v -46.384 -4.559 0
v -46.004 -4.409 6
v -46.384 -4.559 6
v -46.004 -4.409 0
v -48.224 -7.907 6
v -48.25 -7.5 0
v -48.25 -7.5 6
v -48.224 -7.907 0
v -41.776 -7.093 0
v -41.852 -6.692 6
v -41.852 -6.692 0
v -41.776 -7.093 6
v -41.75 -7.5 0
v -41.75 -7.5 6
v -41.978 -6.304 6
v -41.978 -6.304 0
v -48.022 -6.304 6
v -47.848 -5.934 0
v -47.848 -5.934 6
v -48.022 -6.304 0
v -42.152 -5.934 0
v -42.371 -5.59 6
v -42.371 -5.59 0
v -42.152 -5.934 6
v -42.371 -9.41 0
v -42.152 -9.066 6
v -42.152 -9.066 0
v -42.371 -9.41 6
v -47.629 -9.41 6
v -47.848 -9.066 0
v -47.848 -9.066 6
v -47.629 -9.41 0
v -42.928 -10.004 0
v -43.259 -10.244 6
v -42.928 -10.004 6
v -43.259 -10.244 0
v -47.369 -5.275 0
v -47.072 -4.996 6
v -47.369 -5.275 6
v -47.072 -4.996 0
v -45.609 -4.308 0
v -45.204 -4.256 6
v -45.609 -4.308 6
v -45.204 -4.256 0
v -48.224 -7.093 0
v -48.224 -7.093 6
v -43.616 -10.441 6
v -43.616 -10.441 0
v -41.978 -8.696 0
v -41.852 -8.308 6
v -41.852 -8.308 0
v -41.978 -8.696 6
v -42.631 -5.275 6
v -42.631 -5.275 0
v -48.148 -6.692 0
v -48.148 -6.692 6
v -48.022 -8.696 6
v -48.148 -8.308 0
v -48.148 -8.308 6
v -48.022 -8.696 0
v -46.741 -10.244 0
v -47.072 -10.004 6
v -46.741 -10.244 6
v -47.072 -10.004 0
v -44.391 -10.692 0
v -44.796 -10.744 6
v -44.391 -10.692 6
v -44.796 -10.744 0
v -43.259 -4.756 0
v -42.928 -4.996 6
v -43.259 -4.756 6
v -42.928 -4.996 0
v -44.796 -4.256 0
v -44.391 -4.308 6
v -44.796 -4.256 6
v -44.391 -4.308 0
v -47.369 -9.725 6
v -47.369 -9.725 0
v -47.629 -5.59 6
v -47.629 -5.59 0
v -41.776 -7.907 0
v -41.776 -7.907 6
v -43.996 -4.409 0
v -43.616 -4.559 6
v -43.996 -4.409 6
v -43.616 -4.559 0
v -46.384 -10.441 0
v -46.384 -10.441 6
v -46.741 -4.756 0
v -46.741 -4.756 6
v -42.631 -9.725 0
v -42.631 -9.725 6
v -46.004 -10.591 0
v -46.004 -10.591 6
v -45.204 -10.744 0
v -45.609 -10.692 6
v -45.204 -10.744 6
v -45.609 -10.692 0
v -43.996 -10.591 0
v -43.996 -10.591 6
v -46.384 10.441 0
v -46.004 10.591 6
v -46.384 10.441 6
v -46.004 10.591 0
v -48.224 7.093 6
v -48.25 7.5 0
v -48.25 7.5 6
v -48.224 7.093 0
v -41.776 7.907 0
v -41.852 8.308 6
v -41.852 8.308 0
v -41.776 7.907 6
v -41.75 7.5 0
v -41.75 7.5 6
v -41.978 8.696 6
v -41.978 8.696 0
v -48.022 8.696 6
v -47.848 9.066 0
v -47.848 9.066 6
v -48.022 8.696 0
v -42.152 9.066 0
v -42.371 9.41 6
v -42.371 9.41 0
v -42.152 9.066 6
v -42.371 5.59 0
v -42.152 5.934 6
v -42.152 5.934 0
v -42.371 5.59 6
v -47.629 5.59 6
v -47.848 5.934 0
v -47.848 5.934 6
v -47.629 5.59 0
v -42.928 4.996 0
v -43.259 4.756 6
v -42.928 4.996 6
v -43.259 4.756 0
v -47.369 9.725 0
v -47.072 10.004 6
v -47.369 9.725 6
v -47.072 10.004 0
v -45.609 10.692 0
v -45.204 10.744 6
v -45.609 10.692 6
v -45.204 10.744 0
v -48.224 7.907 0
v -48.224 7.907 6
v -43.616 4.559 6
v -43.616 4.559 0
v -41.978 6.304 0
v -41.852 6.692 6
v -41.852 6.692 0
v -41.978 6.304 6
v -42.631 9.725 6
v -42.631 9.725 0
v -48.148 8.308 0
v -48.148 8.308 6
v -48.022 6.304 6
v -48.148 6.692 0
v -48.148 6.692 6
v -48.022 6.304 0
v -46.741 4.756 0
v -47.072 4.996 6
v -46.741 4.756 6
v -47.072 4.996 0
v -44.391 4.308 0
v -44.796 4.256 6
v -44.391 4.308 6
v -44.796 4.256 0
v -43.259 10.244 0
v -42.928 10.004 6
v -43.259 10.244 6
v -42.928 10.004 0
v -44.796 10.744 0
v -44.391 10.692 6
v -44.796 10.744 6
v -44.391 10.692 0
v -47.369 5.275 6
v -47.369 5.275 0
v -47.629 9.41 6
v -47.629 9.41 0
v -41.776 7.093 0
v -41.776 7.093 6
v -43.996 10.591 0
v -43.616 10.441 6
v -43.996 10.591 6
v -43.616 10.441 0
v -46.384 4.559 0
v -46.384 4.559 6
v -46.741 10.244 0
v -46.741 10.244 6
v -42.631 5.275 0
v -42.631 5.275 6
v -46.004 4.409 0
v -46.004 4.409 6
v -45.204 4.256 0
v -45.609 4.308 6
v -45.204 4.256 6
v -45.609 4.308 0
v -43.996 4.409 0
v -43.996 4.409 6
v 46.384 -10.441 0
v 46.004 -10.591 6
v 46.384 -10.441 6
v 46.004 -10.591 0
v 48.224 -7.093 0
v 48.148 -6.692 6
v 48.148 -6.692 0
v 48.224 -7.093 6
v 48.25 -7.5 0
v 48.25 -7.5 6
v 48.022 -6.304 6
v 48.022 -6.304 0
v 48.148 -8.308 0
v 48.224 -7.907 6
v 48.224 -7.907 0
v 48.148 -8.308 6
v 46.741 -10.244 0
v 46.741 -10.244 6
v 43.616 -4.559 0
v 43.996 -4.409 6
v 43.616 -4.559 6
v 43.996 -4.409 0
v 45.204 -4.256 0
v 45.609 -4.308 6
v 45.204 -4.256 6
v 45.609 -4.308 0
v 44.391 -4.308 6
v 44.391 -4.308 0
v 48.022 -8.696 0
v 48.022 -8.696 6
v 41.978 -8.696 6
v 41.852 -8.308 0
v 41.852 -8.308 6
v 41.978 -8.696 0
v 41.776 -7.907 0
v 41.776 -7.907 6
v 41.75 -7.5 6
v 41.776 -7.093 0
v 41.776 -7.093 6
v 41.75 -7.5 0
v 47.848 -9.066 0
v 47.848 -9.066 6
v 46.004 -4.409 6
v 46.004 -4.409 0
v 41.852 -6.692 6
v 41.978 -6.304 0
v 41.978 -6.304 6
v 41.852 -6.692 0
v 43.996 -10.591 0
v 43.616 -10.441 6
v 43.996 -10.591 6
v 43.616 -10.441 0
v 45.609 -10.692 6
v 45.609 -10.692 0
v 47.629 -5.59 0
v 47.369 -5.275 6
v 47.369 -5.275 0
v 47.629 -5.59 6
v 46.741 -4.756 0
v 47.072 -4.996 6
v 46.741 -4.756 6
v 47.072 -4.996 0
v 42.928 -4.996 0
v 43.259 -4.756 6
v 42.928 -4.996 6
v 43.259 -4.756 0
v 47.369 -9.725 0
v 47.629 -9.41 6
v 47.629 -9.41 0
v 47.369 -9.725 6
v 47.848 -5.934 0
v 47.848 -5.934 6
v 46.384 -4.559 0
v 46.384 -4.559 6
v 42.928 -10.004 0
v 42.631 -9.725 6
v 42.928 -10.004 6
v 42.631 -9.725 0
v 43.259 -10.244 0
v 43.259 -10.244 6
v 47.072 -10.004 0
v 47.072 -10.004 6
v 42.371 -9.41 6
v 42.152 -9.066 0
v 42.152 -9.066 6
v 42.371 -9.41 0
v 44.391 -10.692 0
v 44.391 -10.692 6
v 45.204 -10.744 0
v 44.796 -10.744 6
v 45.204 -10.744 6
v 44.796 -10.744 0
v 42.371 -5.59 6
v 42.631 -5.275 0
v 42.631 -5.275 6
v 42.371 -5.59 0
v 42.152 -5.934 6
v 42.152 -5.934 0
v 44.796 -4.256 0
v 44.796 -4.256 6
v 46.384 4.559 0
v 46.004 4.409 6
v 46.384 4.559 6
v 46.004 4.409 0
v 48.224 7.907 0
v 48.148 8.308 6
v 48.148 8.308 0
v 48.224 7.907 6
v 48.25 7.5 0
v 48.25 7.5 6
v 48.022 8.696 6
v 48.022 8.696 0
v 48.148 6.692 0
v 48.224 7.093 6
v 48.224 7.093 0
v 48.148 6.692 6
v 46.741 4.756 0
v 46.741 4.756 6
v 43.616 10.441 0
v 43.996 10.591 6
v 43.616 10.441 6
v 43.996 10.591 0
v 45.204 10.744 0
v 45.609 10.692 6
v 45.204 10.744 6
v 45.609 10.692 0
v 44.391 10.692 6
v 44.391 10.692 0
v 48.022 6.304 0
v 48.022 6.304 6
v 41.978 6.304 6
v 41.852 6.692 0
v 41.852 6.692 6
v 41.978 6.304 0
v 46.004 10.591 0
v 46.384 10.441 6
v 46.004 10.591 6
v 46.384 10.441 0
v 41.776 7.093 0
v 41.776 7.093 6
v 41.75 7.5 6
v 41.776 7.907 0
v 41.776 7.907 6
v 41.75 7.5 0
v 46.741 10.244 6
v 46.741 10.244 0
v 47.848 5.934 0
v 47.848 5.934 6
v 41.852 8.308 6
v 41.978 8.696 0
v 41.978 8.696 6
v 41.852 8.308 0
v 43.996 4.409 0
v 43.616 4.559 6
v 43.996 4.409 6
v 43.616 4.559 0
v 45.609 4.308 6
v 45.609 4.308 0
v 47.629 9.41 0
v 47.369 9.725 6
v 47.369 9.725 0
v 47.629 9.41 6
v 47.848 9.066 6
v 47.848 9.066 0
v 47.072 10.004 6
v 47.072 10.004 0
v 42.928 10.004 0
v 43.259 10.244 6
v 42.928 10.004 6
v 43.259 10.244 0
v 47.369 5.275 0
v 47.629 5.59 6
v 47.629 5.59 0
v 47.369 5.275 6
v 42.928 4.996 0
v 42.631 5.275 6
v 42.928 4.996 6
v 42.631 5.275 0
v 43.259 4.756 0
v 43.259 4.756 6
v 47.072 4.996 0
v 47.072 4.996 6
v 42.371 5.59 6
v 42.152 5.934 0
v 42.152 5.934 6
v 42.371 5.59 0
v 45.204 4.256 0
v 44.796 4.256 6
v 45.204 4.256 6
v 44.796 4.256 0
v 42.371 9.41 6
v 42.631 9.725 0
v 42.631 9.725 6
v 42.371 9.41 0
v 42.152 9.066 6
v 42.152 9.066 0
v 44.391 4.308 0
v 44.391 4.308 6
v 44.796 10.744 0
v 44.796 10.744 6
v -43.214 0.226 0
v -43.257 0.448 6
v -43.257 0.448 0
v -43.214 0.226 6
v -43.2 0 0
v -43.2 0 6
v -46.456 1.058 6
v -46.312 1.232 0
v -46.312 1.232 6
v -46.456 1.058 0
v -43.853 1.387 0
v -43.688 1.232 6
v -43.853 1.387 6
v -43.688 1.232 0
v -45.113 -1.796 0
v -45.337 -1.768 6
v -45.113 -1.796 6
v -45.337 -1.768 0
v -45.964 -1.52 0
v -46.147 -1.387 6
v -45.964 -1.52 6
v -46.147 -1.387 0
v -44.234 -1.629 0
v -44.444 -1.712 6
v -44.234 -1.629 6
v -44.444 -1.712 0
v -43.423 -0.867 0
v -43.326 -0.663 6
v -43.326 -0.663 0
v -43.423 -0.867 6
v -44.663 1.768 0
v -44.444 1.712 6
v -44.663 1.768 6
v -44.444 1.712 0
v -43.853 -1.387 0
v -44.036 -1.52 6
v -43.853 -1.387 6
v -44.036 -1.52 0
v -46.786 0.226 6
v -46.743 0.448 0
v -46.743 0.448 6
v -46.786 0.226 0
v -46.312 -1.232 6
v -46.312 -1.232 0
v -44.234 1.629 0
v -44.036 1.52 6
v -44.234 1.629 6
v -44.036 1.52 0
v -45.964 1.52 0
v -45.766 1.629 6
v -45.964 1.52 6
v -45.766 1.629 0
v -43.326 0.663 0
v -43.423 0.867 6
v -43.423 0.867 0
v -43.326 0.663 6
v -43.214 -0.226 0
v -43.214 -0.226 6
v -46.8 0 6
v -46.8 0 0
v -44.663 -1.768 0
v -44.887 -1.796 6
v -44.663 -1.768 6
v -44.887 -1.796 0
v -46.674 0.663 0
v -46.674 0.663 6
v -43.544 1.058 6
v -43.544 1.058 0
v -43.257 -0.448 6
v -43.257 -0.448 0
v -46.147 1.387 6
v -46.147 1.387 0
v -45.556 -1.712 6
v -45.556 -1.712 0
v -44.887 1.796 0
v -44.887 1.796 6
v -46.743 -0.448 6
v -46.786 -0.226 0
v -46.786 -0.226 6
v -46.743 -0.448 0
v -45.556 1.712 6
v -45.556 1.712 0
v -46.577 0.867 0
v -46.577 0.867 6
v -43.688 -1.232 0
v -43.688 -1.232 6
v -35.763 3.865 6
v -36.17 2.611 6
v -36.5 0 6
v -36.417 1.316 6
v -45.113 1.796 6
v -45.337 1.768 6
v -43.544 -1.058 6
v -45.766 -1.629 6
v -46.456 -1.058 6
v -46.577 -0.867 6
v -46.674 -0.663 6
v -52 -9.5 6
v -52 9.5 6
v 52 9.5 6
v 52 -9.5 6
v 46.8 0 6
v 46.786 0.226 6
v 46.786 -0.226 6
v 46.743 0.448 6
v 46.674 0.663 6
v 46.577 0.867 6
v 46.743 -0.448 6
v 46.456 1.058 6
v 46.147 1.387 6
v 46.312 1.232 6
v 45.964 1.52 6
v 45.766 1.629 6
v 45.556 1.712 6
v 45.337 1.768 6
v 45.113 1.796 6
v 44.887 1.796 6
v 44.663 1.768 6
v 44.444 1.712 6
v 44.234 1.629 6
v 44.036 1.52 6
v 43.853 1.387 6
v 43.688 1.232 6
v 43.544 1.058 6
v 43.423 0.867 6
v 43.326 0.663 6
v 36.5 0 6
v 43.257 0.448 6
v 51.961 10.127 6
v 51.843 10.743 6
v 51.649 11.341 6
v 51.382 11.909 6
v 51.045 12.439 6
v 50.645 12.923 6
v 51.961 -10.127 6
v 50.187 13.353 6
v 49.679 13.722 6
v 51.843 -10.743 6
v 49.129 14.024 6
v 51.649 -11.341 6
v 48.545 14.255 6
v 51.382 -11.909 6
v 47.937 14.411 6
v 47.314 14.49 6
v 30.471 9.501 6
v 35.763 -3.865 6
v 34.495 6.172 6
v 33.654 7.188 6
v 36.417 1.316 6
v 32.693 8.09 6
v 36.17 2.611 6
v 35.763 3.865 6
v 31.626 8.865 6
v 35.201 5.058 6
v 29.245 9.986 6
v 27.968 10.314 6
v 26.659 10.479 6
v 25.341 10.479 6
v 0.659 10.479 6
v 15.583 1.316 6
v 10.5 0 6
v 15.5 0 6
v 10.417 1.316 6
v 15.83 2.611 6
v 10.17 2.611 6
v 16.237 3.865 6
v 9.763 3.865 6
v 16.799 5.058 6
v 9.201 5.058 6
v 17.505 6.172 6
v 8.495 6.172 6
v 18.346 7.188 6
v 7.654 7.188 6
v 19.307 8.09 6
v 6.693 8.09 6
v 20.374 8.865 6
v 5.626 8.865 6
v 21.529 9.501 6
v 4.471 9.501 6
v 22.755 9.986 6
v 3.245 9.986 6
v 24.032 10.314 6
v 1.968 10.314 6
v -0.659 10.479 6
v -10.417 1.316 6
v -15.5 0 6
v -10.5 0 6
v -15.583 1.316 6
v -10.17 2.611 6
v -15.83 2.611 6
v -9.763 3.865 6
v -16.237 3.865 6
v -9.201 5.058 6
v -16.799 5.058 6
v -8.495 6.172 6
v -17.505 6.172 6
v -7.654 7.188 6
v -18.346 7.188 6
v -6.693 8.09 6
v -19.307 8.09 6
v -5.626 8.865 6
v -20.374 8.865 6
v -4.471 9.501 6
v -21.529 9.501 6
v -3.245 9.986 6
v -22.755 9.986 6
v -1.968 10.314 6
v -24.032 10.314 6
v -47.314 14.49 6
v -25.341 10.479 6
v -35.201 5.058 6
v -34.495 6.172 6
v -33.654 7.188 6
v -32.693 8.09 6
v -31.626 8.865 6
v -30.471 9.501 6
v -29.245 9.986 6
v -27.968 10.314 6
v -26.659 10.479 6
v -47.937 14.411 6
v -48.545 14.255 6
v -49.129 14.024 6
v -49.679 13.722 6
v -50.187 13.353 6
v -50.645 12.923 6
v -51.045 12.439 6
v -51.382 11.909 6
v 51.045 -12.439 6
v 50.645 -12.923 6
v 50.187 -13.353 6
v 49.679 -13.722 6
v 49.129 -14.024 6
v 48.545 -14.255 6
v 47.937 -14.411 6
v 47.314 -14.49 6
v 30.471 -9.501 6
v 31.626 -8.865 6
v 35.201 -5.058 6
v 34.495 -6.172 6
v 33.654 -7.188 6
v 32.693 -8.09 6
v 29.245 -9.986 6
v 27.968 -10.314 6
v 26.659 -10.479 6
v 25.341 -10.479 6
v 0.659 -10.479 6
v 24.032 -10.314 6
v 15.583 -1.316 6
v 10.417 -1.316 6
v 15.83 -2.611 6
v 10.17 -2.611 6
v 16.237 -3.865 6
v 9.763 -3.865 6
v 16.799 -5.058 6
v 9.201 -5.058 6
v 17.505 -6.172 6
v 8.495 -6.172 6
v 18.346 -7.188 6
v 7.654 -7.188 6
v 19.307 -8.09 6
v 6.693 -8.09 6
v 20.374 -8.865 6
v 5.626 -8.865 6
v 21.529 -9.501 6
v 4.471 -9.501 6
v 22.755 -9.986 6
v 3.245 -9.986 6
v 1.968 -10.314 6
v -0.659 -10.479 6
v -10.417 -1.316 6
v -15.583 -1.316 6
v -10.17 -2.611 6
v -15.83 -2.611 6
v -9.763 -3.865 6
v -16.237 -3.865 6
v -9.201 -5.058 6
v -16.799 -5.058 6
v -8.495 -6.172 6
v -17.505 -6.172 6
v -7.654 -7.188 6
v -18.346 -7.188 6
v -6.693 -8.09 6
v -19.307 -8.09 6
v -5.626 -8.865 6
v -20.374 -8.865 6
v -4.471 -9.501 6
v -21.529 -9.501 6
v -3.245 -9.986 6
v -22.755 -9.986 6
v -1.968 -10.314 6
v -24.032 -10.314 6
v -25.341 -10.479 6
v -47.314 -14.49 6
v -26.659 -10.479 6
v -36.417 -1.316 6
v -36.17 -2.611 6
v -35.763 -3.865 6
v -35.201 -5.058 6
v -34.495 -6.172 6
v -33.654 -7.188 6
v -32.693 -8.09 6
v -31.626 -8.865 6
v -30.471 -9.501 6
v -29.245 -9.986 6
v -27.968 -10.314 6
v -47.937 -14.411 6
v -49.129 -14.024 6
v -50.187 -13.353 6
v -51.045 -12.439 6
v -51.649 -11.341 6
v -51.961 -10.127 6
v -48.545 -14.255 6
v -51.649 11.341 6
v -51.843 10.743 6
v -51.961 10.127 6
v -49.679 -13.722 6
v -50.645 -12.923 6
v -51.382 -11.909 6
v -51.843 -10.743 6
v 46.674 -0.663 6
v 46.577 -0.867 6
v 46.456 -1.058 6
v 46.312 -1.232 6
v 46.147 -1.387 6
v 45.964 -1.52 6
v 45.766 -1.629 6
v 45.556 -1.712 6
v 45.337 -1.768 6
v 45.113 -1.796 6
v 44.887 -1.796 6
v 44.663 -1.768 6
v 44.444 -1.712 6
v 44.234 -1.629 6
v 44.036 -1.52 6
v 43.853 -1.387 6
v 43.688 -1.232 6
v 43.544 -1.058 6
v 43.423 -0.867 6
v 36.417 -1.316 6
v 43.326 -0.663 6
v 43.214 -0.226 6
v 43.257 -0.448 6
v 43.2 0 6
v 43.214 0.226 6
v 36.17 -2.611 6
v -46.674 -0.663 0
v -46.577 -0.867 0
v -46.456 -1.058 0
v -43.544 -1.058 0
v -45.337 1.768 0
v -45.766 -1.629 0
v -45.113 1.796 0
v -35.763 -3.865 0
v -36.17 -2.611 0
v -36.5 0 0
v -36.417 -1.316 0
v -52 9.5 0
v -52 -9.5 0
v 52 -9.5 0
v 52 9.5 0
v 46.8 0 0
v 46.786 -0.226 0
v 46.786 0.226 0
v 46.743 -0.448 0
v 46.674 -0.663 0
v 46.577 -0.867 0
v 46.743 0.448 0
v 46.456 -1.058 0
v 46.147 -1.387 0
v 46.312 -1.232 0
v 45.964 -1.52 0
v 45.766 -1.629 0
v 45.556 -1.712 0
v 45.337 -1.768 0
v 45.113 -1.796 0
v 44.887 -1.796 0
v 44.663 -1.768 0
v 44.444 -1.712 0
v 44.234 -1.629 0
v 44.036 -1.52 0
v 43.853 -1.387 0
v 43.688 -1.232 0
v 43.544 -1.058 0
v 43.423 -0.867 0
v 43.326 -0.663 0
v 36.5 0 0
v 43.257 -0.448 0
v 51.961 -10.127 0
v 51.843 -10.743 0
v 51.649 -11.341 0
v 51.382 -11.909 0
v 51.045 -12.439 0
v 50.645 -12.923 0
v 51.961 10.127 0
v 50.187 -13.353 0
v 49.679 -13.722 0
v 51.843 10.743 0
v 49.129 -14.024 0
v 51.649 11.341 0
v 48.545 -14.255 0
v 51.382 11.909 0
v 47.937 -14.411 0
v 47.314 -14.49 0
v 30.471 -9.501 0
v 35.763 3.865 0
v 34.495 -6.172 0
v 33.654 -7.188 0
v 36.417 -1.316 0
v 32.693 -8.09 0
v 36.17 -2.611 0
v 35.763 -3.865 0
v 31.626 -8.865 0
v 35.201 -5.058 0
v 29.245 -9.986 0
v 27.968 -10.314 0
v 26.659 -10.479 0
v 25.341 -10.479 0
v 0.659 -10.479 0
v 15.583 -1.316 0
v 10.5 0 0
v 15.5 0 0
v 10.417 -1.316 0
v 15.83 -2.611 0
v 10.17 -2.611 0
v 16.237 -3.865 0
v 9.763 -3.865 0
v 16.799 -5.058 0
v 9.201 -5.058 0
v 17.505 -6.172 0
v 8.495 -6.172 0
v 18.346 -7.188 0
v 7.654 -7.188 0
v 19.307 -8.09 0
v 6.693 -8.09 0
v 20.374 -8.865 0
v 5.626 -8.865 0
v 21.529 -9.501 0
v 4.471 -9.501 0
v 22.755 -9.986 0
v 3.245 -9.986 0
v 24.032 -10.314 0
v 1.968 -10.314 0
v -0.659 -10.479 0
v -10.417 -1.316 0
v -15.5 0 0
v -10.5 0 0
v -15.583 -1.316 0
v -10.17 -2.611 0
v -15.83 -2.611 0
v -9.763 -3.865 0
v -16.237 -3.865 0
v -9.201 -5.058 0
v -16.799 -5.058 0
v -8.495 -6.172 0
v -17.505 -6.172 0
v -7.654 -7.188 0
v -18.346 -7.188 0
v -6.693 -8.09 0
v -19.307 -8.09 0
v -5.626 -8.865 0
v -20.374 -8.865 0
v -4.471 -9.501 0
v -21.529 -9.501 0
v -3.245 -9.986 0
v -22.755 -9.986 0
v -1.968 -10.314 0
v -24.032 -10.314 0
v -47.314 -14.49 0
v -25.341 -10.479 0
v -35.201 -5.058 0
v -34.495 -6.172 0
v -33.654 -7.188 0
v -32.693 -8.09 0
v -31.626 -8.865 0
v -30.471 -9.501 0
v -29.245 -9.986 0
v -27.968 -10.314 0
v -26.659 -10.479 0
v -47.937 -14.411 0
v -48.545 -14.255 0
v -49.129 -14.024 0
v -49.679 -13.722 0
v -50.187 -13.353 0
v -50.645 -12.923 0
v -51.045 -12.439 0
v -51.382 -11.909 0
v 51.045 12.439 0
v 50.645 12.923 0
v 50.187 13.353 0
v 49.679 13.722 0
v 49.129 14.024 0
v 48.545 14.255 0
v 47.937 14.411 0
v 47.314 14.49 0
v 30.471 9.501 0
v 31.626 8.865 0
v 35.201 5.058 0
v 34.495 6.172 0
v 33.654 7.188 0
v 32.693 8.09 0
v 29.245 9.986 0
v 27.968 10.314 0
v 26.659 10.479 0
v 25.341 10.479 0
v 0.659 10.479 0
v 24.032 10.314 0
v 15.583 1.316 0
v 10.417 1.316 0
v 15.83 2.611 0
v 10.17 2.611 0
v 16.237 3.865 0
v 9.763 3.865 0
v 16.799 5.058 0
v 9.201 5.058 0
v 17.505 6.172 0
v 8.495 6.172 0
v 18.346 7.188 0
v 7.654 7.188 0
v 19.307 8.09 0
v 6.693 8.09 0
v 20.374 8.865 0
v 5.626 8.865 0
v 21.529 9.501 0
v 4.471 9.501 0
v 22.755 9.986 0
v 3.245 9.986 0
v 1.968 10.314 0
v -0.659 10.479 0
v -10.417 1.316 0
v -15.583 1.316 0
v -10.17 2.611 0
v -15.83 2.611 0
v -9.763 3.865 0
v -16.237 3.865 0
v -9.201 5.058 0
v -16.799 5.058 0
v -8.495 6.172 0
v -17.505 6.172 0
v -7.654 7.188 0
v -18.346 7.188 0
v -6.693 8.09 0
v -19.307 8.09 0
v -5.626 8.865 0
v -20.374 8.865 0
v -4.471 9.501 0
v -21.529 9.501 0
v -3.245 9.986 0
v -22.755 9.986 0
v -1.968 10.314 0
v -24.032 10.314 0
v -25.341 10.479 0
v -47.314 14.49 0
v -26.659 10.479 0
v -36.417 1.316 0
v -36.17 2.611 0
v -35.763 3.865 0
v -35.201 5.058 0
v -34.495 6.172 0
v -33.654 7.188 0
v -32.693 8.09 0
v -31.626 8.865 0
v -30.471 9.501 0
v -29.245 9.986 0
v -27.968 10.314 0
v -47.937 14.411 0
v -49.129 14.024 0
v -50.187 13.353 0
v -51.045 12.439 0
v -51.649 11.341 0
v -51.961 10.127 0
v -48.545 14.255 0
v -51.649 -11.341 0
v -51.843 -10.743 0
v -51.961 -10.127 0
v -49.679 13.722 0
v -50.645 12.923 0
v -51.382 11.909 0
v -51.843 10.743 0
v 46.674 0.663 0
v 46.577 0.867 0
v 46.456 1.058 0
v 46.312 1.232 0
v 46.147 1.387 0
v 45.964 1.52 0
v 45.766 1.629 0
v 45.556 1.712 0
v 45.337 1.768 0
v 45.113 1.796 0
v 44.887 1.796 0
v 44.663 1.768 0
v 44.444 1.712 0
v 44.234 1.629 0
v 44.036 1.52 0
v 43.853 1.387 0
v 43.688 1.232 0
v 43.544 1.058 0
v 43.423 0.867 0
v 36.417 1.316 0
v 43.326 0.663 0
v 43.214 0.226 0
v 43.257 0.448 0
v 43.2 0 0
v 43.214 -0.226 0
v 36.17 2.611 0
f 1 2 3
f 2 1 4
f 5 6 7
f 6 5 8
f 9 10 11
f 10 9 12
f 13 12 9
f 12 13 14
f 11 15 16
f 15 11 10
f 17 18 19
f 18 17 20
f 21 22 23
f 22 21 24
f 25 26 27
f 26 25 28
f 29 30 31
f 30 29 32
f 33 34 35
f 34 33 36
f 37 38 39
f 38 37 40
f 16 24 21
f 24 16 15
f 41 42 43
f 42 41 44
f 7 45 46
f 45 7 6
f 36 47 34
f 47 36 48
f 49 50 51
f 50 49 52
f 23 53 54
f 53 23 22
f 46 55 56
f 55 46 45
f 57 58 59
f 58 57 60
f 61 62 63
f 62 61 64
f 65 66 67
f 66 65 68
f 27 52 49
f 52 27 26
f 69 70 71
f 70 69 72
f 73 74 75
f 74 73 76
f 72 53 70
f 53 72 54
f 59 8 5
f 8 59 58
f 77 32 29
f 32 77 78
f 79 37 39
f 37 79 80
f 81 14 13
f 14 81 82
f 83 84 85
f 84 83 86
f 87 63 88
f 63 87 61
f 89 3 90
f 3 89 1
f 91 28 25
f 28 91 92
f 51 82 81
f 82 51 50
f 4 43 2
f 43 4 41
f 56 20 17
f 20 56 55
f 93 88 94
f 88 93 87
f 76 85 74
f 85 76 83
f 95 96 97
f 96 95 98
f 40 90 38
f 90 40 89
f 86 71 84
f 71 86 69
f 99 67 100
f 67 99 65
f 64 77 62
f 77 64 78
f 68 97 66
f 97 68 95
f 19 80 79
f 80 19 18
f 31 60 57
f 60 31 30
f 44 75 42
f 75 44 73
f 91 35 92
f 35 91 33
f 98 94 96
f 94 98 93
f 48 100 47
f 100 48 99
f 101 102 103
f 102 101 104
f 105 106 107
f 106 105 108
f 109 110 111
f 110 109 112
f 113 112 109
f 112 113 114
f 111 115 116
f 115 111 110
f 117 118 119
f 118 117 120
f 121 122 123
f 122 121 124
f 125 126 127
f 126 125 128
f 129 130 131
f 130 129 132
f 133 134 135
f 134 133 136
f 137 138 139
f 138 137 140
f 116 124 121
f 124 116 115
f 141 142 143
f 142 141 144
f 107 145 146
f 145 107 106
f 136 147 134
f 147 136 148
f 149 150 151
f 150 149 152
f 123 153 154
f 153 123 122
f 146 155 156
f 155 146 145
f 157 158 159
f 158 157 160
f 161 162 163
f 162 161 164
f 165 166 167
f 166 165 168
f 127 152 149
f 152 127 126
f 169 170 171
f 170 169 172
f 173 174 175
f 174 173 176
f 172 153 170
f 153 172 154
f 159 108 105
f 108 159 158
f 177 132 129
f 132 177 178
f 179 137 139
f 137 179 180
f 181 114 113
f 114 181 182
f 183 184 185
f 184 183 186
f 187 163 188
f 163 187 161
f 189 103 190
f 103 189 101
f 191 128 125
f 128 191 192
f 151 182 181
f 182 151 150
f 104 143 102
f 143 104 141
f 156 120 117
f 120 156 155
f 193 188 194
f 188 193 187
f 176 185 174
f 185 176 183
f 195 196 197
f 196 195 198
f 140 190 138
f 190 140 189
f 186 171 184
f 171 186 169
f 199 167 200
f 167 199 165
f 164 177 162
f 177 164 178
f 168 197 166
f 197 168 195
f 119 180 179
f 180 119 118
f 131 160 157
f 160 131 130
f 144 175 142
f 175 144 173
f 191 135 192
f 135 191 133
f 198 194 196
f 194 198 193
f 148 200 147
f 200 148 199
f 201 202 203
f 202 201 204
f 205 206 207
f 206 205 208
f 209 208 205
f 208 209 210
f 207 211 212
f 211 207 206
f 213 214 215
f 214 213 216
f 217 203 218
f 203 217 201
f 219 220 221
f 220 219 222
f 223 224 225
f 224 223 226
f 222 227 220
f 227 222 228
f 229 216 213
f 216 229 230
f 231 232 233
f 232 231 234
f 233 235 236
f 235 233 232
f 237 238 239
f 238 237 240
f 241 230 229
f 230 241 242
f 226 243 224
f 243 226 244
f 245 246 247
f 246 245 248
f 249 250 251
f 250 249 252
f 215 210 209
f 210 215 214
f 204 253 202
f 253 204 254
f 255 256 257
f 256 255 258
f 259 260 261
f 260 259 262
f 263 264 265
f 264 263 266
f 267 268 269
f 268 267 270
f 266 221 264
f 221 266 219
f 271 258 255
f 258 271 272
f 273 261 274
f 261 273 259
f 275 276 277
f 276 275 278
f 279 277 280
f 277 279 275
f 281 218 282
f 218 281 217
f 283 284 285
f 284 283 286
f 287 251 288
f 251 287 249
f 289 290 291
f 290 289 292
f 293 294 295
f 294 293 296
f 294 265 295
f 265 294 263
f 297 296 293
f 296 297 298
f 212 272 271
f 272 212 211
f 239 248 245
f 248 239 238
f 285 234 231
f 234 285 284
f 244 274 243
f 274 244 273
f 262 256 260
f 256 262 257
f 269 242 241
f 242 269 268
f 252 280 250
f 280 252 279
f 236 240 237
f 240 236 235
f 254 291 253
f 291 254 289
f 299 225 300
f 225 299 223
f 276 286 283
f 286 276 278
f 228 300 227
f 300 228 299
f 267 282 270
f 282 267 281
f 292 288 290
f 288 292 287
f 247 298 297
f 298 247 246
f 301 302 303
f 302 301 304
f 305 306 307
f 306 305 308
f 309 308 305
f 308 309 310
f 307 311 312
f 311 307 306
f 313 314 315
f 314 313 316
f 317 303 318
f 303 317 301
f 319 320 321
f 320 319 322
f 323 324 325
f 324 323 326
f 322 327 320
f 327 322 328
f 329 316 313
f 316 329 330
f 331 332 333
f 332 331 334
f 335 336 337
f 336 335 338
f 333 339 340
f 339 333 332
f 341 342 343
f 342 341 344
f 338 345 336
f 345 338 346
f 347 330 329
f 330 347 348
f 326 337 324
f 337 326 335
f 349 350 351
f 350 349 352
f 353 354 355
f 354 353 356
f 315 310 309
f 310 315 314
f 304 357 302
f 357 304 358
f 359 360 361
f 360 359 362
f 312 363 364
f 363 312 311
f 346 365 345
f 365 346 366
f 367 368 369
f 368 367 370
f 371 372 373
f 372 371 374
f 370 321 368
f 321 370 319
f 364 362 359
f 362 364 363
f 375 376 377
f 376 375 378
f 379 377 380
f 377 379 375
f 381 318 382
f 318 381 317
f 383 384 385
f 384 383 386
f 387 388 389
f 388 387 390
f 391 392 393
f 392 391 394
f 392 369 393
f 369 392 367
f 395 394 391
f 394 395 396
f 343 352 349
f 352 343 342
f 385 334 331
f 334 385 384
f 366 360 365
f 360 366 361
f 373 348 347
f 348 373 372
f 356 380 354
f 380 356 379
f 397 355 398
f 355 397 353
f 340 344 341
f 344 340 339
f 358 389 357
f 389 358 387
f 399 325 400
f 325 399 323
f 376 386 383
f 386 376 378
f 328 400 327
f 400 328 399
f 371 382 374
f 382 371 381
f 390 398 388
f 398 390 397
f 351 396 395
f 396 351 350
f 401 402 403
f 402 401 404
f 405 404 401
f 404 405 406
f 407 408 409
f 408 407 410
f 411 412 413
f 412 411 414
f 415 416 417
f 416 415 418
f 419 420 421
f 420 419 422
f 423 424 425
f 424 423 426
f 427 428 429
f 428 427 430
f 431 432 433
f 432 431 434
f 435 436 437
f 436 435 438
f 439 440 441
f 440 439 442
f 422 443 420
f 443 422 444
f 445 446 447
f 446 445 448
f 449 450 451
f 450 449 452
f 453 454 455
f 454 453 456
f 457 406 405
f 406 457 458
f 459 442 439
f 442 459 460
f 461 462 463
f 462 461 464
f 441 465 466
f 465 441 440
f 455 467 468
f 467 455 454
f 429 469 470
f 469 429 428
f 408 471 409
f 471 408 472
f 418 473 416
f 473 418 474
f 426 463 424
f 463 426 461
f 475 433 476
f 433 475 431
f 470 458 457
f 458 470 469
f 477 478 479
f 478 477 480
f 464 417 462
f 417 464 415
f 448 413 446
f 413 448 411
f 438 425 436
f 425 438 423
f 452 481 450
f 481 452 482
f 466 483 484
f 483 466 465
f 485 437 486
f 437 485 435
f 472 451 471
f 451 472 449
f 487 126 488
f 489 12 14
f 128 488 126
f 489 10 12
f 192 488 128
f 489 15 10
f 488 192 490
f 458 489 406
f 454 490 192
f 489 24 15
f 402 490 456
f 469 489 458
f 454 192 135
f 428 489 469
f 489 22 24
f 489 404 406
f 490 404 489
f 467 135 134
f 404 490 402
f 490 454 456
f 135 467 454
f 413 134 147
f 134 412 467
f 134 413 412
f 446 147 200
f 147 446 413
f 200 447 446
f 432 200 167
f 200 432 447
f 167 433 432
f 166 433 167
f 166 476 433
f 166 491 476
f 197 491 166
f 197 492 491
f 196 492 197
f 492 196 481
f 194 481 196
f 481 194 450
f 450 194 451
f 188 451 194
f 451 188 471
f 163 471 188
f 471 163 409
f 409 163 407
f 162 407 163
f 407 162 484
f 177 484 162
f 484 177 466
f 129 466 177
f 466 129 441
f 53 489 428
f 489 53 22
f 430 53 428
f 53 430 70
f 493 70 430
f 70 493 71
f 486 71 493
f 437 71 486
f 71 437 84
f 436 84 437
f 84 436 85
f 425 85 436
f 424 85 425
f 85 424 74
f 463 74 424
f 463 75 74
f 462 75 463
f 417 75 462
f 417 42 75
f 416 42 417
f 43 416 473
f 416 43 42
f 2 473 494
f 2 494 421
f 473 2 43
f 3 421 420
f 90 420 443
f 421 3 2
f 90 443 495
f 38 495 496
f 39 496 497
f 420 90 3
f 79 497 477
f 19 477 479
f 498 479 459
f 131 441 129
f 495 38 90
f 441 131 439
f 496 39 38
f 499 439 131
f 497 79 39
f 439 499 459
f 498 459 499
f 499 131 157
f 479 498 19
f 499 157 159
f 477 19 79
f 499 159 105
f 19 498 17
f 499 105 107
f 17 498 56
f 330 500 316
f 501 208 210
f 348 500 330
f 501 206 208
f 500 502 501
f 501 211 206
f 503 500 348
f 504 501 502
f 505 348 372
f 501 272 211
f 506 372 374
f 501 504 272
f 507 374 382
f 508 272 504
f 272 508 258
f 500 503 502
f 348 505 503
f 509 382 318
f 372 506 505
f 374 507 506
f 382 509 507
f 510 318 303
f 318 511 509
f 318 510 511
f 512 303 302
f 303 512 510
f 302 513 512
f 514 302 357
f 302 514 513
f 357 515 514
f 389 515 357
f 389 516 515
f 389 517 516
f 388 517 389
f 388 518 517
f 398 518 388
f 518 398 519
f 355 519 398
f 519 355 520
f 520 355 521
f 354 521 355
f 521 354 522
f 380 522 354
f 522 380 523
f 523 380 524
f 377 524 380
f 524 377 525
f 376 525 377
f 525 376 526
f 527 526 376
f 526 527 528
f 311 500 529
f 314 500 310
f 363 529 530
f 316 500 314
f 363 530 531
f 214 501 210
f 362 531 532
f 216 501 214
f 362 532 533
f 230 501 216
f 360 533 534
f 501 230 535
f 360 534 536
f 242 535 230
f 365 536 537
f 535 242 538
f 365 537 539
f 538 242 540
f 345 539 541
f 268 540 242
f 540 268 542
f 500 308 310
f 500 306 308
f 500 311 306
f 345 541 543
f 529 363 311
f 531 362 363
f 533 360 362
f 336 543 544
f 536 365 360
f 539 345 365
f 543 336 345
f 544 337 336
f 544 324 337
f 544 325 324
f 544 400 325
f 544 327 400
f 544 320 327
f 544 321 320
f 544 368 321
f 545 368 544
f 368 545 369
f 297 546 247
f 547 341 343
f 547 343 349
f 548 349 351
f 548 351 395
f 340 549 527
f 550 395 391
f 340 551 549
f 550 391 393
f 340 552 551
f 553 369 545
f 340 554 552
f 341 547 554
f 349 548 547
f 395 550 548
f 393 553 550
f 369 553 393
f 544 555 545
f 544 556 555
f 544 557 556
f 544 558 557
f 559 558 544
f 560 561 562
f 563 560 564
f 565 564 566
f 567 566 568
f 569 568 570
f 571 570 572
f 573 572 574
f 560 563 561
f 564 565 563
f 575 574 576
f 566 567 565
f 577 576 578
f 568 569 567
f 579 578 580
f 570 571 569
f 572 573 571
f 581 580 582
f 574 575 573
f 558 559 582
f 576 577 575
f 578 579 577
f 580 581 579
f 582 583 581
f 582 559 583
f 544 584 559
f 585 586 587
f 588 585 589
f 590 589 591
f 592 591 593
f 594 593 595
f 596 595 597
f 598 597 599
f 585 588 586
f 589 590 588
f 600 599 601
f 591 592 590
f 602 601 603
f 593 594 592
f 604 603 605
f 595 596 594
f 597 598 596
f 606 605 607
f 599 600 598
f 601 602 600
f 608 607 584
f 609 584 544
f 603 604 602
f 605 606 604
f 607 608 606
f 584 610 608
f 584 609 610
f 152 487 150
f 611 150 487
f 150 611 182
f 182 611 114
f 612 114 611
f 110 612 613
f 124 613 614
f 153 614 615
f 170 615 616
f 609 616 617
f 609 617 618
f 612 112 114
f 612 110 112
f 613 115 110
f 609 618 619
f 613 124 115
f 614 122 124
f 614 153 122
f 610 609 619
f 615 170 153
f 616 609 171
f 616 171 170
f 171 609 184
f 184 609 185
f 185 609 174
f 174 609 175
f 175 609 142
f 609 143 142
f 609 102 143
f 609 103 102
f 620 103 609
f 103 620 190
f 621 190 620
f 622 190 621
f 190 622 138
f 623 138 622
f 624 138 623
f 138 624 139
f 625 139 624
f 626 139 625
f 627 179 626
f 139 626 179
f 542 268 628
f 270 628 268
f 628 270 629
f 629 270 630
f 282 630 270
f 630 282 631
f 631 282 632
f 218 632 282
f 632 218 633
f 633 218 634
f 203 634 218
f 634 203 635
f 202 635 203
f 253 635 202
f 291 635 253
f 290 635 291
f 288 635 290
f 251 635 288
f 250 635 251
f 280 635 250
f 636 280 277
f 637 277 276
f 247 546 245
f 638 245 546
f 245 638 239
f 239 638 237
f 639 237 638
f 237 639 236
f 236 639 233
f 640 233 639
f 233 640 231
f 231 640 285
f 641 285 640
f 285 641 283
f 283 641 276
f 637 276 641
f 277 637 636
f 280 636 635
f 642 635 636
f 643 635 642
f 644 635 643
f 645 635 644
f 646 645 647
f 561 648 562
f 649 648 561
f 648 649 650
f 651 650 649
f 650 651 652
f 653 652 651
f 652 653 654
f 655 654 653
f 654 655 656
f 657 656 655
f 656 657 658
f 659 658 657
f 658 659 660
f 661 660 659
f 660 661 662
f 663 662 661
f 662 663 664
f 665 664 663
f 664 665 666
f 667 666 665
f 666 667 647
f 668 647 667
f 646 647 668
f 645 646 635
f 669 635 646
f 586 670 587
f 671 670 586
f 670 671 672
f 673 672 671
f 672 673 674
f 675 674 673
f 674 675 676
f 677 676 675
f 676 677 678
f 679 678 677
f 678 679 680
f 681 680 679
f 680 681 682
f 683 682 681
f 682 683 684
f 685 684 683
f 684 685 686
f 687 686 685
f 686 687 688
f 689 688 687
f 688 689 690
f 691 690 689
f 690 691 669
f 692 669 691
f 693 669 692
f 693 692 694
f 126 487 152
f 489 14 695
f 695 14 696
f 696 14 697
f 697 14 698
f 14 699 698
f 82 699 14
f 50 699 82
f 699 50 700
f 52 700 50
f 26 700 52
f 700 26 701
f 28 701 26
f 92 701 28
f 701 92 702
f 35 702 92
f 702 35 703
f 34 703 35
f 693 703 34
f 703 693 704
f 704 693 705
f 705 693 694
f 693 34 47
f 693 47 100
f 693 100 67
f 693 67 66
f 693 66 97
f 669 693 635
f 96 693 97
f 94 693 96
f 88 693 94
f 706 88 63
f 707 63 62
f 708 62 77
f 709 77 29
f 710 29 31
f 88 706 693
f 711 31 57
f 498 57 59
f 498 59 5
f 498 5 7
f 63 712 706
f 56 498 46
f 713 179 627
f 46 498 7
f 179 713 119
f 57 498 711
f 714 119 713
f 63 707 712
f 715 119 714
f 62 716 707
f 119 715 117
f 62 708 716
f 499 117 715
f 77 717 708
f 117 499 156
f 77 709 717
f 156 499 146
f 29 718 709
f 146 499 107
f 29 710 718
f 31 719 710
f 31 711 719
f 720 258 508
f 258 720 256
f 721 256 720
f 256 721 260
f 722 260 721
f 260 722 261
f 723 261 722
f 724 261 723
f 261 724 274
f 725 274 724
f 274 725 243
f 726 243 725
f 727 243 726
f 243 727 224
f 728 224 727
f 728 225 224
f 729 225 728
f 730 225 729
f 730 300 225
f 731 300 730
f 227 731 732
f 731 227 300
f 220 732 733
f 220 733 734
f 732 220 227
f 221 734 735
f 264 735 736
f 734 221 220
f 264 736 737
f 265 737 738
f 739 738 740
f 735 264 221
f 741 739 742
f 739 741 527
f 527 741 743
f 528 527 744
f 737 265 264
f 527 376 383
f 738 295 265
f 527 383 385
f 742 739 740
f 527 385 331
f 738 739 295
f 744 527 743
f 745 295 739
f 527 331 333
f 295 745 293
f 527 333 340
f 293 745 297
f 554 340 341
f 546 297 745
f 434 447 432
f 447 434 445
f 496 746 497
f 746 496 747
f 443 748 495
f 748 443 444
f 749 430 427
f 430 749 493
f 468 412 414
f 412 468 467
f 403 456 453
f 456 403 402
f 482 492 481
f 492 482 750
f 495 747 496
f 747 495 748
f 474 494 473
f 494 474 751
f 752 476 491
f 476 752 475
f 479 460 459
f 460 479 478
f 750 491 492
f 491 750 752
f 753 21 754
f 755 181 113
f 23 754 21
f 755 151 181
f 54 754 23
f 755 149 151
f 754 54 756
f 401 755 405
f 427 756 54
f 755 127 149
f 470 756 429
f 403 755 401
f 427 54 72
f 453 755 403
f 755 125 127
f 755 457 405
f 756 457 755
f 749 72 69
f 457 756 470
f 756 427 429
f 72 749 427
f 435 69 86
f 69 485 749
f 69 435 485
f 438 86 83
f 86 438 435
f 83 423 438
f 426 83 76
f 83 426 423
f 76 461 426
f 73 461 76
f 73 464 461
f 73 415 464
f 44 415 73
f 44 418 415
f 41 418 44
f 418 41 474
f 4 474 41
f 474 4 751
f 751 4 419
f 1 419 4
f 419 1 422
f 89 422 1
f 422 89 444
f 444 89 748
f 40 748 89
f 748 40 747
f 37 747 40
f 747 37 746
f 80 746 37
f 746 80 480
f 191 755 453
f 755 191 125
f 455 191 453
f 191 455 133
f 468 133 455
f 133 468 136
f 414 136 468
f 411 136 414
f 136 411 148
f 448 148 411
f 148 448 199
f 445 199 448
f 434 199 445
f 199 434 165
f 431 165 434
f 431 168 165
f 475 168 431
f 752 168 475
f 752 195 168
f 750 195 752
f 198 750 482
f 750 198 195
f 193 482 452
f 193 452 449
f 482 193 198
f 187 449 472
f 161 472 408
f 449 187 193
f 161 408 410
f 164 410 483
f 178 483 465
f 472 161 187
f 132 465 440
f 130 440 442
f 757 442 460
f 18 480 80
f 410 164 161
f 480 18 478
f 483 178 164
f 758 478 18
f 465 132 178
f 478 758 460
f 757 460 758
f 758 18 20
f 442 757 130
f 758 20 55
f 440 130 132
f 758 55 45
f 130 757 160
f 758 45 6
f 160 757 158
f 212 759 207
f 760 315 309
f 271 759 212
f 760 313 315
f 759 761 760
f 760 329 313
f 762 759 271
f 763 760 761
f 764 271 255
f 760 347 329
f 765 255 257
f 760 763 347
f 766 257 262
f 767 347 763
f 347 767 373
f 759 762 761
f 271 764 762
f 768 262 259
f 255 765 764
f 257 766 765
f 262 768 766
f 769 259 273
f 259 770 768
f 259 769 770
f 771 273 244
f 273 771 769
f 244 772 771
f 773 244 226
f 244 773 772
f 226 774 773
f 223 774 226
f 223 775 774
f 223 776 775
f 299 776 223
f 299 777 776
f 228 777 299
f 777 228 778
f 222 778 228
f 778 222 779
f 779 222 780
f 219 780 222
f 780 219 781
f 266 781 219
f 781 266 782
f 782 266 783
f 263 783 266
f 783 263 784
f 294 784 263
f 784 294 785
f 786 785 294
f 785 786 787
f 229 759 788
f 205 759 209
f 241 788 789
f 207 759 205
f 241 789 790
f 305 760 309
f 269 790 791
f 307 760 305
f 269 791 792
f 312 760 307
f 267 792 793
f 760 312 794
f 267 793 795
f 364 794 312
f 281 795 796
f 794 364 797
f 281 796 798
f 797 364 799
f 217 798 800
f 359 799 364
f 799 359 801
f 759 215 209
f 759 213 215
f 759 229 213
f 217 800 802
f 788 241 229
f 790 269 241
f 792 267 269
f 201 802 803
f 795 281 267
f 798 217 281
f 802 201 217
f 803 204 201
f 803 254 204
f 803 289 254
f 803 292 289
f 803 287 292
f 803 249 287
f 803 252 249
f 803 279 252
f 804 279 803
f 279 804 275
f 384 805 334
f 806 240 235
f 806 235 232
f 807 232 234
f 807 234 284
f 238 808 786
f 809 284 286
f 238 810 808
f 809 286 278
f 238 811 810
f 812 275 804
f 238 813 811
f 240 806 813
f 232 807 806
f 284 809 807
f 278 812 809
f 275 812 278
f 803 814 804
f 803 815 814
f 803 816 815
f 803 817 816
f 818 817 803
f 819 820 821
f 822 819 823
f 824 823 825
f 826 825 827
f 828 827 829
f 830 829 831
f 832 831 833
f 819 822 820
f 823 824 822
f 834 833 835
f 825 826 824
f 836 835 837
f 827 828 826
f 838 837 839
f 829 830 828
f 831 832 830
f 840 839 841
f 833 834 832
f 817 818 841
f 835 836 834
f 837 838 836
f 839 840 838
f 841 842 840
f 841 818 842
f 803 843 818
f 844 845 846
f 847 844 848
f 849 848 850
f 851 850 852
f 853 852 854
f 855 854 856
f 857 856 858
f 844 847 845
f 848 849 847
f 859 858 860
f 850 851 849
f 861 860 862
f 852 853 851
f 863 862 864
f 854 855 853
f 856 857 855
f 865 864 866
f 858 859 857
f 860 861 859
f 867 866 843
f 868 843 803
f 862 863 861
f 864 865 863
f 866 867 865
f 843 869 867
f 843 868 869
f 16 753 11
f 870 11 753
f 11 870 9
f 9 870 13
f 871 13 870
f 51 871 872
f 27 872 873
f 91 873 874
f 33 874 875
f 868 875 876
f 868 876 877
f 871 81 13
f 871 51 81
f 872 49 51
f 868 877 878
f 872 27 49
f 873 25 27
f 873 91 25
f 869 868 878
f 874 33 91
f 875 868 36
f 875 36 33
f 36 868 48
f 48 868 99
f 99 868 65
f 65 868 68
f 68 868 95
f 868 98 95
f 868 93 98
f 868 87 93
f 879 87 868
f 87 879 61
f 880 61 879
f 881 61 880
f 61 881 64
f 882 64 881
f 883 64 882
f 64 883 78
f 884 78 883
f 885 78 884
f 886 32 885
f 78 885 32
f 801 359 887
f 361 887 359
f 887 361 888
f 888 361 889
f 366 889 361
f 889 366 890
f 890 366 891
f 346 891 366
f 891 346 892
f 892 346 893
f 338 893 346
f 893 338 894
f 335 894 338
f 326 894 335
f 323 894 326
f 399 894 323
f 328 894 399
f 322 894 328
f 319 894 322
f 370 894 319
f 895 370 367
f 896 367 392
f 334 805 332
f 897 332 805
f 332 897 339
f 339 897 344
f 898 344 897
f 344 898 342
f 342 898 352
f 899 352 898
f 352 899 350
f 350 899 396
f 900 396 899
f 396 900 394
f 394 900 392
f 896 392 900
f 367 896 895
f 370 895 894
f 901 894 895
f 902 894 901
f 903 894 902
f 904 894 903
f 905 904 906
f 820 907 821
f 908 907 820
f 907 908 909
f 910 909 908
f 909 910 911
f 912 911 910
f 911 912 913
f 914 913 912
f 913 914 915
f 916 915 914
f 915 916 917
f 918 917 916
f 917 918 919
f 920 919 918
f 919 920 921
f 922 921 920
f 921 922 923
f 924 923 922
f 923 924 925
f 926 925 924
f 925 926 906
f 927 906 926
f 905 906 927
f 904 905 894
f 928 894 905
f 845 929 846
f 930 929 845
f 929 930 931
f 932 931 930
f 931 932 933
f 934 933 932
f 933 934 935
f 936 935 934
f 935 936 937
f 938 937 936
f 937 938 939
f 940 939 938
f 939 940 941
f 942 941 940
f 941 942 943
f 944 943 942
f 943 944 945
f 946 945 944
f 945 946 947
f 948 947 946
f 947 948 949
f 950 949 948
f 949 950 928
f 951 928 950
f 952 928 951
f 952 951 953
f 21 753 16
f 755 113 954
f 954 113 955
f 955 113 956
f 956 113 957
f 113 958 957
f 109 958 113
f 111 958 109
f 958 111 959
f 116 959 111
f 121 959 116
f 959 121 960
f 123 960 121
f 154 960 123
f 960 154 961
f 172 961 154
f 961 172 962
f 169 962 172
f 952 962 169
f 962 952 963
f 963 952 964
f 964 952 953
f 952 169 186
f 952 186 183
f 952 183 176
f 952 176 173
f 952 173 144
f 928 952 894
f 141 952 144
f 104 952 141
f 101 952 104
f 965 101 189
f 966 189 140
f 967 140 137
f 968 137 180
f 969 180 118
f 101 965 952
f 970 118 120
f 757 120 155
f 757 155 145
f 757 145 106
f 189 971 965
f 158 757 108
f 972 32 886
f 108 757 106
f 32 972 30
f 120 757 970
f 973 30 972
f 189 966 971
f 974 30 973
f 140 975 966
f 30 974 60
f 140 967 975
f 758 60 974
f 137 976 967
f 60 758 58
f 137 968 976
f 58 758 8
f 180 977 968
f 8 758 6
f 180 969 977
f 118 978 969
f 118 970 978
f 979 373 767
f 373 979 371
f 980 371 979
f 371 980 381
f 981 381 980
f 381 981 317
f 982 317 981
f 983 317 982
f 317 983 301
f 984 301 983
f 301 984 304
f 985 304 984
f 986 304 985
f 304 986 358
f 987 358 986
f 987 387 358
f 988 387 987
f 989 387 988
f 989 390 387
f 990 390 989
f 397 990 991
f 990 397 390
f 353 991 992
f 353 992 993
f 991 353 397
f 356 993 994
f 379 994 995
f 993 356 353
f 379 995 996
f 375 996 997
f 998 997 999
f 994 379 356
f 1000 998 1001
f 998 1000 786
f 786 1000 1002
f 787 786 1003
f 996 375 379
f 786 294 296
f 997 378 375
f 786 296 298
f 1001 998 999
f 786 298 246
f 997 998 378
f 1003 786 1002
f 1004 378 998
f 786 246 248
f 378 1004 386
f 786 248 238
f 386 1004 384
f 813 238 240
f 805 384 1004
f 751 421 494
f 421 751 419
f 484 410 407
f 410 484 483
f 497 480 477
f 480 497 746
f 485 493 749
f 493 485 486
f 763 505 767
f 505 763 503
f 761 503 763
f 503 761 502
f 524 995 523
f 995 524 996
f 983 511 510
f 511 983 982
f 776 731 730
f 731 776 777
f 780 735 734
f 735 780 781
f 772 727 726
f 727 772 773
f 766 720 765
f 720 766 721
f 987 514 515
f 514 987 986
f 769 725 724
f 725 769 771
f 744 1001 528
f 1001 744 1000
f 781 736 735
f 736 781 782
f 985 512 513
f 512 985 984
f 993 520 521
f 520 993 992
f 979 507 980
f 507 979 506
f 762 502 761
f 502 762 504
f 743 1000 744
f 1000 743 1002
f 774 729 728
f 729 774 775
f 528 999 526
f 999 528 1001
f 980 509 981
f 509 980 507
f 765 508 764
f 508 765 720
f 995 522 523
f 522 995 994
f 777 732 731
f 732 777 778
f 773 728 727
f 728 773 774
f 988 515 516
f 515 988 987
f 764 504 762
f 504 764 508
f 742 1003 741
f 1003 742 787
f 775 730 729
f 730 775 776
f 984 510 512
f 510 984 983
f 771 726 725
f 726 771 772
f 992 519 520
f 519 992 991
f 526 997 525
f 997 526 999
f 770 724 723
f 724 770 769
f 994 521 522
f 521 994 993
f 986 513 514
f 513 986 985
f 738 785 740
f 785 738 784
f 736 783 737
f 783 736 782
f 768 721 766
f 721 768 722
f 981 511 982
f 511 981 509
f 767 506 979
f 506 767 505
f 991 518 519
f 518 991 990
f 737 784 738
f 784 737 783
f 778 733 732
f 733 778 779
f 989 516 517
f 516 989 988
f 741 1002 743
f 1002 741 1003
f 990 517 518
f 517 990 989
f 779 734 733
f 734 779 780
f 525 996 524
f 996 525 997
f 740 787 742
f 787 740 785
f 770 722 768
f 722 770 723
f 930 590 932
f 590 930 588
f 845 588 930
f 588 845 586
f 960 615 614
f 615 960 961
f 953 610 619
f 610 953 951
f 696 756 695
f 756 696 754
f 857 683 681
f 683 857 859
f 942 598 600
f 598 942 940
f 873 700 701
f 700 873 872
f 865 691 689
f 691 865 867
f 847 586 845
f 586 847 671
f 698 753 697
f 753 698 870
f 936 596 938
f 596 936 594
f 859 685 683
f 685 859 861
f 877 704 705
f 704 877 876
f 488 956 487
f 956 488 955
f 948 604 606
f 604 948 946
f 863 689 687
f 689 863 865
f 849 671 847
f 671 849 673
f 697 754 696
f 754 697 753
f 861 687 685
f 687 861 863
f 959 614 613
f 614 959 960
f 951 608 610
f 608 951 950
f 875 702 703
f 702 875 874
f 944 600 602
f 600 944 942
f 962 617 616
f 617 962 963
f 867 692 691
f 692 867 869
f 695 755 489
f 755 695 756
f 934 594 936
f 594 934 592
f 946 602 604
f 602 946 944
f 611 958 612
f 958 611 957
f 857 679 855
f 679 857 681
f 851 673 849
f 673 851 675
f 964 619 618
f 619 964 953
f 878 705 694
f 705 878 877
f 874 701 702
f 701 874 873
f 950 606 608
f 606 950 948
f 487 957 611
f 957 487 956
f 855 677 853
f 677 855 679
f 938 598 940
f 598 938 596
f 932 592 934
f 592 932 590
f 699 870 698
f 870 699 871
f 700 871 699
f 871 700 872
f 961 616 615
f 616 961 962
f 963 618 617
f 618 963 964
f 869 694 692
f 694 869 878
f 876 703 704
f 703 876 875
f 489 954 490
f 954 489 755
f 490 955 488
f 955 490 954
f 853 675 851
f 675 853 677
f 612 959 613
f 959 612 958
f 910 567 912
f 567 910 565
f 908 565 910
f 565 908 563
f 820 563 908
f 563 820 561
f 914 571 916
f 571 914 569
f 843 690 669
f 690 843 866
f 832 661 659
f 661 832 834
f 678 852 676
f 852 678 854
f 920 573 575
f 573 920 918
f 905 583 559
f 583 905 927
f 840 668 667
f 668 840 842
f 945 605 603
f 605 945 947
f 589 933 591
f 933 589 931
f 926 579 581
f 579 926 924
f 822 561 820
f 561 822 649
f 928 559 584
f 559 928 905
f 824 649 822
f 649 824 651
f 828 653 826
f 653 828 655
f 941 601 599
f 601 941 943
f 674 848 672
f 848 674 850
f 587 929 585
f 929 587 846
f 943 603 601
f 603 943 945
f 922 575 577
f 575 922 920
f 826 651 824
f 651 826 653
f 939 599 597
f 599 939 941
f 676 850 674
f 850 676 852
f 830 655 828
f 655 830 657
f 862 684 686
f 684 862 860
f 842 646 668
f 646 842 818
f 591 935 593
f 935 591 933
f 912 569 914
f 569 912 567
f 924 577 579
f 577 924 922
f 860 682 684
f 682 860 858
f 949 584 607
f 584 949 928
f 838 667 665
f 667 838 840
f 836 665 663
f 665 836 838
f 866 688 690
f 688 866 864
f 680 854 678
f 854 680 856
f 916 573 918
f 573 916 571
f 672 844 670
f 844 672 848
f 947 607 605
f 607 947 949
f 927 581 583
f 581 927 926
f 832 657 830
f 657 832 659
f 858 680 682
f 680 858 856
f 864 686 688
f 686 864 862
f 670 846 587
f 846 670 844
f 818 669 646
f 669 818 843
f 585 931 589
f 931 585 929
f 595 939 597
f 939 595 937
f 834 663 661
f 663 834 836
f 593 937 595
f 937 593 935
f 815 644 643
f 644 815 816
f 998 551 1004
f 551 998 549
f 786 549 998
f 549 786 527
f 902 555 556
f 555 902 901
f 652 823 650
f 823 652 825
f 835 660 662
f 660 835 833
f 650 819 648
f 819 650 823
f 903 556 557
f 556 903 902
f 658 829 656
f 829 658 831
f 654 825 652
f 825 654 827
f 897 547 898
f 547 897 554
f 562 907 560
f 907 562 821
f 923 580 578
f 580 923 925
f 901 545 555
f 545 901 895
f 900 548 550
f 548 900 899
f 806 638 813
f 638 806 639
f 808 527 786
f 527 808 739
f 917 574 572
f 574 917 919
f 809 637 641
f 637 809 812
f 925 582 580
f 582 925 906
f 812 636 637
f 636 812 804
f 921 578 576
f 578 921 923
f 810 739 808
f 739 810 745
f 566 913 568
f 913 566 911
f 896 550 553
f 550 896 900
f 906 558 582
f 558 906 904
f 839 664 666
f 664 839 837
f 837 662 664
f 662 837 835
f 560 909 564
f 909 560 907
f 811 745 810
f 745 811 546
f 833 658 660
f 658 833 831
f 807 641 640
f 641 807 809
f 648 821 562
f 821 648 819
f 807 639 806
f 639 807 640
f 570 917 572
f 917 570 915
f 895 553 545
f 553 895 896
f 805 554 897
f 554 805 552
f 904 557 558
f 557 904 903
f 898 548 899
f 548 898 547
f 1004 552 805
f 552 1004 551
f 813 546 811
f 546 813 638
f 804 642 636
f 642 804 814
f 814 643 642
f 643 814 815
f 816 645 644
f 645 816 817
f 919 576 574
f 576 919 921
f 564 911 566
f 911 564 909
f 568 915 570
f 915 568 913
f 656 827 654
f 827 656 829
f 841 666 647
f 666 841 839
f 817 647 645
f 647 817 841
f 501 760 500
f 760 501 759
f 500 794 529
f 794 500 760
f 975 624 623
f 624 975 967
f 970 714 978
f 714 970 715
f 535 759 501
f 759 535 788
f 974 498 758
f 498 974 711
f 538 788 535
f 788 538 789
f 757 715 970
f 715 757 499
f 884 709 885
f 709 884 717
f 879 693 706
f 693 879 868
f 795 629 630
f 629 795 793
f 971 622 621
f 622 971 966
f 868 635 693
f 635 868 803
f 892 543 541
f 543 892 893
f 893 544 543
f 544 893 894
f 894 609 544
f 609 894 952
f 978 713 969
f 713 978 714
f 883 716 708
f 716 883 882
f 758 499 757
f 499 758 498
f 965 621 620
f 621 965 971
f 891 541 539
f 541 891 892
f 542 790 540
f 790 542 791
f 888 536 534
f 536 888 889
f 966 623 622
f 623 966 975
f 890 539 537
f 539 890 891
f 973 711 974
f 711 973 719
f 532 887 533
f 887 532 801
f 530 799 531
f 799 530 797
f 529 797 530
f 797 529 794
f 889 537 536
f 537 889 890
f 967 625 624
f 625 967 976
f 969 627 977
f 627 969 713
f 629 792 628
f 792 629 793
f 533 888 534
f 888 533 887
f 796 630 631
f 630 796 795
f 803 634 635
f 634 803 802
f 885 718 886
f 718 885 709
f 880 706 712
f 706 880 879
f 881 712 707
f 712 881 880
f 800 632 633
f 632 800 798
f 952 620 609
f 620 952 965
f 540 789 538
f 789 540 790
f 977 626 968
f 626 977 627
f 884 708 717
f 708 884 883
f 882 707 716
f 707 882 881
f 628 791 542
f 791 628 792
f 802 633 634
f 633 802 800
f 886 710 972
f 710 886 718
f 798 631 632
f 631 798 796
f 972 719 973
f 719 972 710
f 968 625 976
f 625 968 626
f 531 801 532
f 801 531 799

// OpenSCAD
$fn = 50;


difference() {
	union() {
		hull() {
			translate(v = [-47.0000000000, 9.5000000000, 0]) {
				cylinder(h = 6, r = 5);
			}
			translate(v = [47.0000000000, 9.5000000000, 0]) {
				cylinder(h = 6, r = 5);
			}
			translate(v = [-47.0000000000, -9.5000000000, 0]) {
				cylinder(h = 6, r = 5);
			}
			translate(v = [47.0000000000, -9.5000000000, 0]) {
				cylinder(h = 6, r = 5);
			}
		}
	}
	union() {
		#translate(v = [-45.0000000000, -7.5000000000, 0]) {
			cylinder(h = 6, r = 3.2500000000);
		}
		#translate(v = [-45.0000000000, 7.5000000000, 0]) {
			cylinder(h = 6, r = 3.2500000000);
		}
		#translate(v = [45.0000000000, -7.5000000000, 0]) {
			cylinder(h = 6, r = 3.2500000000);
		}
		#translate(v = [45.0000000000, 7.5000000000, 0]) {
			cylinder(h = 6, r = 3.2500000000);
		}
		#translate(v = [-45.0000000000, -7.5000000000, -100.0000000000]) {
			cylinder(h = 200, r = 3.2500000000);
		}
		#translate(v = [-45.0000000000, 7.5000000000, -100.0000000000]) {
			cylinder(h = 200, r = 3.2500000000);
		}
		#translate(v = [45.0000000000, -7.5000000000, -100.0000000000]) {
			cylinder(h = 200, r = 3.2500000000);
		}
		#translate(v = [45.0000000000, 7.5000000000, -100.0000000000]) {
			cylinder(h = 200, r = 3.2500000000);
		}
		#translate(v = [-45.0000000000, -7.5000000000, 0]) {
			cylinder(h = 6, r = 1.8000000000);
		}
		#translate(v = [-45.0000000000, 0.0000000000, 0]) {
			cylinder(h = 6, r = 1.8000000000);
		}
		#translate(v = [-45.0000000000, 7.5000000000, 0]) {
			cylinder(h = 6, r = 1.8000000000);
		}
		#translate(v = [45.0000000000, -7.5000000000, 0]) {
			cylinder(h = 6, r = 1.8000000000);
		}
		#translate(v = [45.0000000000, 0.0000000000, 0]) {
			cylinder(h = 6, r = 1.8000000000);
		}
		#translate(v = [45.0000000000, 7.5000000000, 0]) {
			cylinder(h = 6, r = 1.8000000000);
		}
		#translate(v = [-45.0000000000, -7.5000000000, 0]) {
			cylinder(h = 6, r = 1.8000000000);
		}
		#translate(v = [-45.0000000000, 0.0000000000, 0]) {
			cylinder(h = 6, r = 1.8000000000);
		}
		#translate(v = [-45.0000000000, 7.5000000000, 0]) {
			cylinder(h = 6, r = 1.8000000000);
		}
		#translate(v = [45.0000000000, -7.5000000000, 0]) {
			cylinder(h = 6, r = 1.8000000000);
		}
		#translate(v = [45.0000000000, 0.0000000000, 0]) {
			cylinder(h = 6, r = 1.8000000000);
		}
		#translate(v = [45.0000000000, 7.5000000000, 0]) {
			cylinder(h = 6, r = 1.8000000000);
		}
		#translate(v = [-45.0000000000, -7.5000000000, 0]) {
			cylinder(h = 6, r = 1.8000000000);
		}
		#translate(v = [-45.0000000000, 0.0000000000, 0]) {
			cylinder(h = 6, r = 1.8000000000);
		}
		#translate(v = [-45.0000000000, 7.5000000000, 0]) {
			cylinder(h = 6, r = 1.8000000000);
		}
		#translate(v = [45.0000000000, -7.5000000000, 0]) {
			cylinder(h = 6, r = 1.8000000000);
		}
		#translate(v = [45.0000000000, 0.0000000000, 0]) {
			cylinder(h = 6, r = 1.8000000000);
		}
		#translate(v = [45.0000000000, 7.5000000000, 0]) {
			cylinder(h = 6, r = 1.8000000000);
		}
		#translate(v = [-26.0000000000, 0, 0]) {
			cylinder(h = 6, r = 10.5000000000);
		}
		#cylinder(h = 6, r = 10.5000000000);
		#translate(v = [26.0000000000, 0, 0]) {
			cylinder(h = 6, r = 10.5000000000);
		}
	}
}
